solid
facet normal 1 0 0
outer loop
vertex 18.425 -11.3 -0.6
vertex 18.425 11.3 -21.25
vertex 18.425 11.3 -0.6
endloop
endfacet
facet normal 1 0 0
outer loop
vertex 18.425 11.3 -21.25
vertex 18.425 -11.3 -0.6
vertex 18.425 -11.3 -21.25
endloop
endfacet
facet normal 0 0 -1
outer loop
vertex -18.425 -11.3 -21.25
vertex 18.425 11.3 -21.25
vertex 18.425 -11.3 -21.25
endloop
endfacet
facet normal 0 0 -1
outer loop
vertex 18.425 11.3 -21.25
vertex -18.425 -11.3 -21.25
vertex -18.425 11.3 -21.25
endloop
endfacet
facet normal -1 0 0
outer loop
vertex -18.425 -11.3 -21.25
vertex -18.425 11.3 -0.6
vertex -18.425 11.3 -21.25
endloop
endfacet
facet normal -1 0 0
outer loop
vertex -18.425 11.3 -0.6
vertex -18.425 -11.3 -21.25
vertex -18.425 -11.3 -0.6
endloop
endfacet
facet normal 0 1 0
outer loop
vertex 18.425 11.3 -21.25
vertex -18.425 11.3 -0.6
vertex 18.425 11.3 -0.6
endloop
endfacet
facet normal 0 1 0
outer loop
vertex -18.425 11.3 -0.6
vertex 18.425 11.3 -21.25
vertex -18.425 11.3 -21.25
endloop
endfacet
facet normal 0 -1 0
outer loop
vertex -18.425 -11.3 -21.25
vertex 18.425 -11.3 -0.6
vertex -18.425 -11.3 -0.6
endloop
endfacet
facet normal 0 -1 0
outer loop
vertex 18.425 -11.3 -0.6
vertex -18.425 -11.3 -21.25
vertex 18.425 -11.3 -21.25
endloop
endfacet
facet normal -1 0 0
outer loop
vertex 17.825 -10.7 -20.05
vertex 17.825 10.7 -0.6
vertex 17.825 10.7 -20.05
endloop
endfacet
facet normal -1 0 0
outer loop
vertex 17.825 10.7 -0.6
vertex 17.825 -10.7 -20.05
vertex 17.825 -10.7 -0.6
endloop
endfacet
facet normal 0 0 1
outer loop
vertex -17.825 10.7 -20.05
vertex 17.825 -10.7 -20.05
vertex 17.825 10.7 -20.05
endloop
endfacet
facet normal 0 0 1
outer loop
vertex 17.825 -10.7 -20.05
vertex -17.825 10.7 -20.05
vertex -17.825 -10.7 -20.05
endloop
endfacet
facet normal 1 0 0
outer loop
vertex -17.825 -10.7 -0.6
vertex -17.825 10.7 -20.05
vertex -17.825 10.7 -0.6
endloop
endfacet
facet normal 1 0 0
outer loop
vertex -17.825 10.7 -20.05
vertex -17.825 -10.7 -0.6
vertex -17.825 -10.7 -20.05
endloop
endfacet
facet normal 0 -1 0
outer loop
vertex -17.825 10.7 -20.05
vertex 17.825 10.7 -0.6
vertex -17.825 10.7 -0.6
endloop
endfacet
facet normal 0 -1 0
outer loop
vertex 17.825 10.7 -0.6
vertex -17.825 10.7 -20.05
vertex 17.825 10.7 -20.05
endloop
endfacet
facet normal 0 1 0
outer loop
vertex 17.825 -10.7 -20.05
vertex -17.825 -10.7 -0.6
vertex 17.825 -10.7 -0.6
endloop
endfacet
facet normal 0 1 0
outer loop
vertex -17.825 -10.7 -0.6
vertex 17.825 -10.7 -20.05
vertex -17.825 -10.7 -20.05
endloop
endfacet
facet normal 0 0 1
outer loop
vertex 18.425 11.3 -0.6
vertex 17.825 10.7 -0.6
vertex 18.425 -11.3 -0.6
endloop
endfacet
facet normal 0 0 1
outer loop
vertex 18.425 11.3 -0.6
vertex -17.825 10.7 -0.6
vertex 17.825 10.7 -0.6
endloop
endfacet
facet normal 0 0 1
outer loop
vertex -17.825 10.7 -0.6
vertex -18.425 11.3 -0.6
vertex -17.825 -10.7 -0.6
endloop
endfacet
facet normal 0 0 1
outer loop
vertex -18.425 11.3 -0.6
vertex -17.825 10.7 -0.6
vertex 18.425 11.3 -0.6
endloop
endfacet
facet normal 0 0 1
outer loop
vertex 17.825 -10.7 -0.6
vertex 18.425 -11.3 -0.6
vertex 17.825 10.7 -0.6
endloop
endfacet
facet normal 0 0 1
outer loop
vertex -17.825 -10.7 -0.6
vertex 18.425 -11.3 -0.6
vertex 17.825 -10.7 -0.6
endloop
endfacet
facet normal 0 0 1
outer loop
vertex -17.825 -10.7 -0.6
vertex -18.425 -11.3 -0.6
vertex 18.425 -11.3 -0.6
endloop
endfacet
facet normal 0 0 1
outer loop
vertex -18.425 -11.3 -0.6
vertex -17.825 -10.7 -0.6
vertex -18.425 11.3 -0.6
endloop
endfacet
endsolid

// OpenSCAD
e = $preview ? .1 : .0001;
t = .6;
slop = .1;

blade = [40, 20, 1.37];
n_blades = 25;
blade_block = [blade.z * n_blades + slop, blade.y + slop, blade.x + slop];

d0 = blade_block; //inner shell inside
d1 = d0 + [2*t,2*t,0]; //inner shell
d2 = d1 + [slop,slop,0]; //outer shell inside
d3 = d2 + [2*t,2*t,4*t]; //outer shell outside

module bottom() {
  difference() {
    cube(d1 - [0,0,slop], center=true);
    cube(d0, center=true);
    translate([0,0,5]) cube(d0, center=true);
  }
  difference() {
    cube(d3, center=true);
    cube(d0, center=true);
    translate([0,0,d3.z/2-t+1]) cube(d3 + [2,2,2], center=true);
  }
}
module top() {
  difference() {
    cube(d3, center=true);
    cube(d2, center=true);
    translate([0,0,d3.z/2+1-t]) cube(d3 + [2,2,2], center=true);
  }
}
module fit_check(){
  intersection(){
    union(){
      bottom();
      mirror([0, 0, 1]) top();
    }
    union(){
      cube([100,1,100], center=true);
      cube([1,100,100], center=true);
    }
  }
}
top();
